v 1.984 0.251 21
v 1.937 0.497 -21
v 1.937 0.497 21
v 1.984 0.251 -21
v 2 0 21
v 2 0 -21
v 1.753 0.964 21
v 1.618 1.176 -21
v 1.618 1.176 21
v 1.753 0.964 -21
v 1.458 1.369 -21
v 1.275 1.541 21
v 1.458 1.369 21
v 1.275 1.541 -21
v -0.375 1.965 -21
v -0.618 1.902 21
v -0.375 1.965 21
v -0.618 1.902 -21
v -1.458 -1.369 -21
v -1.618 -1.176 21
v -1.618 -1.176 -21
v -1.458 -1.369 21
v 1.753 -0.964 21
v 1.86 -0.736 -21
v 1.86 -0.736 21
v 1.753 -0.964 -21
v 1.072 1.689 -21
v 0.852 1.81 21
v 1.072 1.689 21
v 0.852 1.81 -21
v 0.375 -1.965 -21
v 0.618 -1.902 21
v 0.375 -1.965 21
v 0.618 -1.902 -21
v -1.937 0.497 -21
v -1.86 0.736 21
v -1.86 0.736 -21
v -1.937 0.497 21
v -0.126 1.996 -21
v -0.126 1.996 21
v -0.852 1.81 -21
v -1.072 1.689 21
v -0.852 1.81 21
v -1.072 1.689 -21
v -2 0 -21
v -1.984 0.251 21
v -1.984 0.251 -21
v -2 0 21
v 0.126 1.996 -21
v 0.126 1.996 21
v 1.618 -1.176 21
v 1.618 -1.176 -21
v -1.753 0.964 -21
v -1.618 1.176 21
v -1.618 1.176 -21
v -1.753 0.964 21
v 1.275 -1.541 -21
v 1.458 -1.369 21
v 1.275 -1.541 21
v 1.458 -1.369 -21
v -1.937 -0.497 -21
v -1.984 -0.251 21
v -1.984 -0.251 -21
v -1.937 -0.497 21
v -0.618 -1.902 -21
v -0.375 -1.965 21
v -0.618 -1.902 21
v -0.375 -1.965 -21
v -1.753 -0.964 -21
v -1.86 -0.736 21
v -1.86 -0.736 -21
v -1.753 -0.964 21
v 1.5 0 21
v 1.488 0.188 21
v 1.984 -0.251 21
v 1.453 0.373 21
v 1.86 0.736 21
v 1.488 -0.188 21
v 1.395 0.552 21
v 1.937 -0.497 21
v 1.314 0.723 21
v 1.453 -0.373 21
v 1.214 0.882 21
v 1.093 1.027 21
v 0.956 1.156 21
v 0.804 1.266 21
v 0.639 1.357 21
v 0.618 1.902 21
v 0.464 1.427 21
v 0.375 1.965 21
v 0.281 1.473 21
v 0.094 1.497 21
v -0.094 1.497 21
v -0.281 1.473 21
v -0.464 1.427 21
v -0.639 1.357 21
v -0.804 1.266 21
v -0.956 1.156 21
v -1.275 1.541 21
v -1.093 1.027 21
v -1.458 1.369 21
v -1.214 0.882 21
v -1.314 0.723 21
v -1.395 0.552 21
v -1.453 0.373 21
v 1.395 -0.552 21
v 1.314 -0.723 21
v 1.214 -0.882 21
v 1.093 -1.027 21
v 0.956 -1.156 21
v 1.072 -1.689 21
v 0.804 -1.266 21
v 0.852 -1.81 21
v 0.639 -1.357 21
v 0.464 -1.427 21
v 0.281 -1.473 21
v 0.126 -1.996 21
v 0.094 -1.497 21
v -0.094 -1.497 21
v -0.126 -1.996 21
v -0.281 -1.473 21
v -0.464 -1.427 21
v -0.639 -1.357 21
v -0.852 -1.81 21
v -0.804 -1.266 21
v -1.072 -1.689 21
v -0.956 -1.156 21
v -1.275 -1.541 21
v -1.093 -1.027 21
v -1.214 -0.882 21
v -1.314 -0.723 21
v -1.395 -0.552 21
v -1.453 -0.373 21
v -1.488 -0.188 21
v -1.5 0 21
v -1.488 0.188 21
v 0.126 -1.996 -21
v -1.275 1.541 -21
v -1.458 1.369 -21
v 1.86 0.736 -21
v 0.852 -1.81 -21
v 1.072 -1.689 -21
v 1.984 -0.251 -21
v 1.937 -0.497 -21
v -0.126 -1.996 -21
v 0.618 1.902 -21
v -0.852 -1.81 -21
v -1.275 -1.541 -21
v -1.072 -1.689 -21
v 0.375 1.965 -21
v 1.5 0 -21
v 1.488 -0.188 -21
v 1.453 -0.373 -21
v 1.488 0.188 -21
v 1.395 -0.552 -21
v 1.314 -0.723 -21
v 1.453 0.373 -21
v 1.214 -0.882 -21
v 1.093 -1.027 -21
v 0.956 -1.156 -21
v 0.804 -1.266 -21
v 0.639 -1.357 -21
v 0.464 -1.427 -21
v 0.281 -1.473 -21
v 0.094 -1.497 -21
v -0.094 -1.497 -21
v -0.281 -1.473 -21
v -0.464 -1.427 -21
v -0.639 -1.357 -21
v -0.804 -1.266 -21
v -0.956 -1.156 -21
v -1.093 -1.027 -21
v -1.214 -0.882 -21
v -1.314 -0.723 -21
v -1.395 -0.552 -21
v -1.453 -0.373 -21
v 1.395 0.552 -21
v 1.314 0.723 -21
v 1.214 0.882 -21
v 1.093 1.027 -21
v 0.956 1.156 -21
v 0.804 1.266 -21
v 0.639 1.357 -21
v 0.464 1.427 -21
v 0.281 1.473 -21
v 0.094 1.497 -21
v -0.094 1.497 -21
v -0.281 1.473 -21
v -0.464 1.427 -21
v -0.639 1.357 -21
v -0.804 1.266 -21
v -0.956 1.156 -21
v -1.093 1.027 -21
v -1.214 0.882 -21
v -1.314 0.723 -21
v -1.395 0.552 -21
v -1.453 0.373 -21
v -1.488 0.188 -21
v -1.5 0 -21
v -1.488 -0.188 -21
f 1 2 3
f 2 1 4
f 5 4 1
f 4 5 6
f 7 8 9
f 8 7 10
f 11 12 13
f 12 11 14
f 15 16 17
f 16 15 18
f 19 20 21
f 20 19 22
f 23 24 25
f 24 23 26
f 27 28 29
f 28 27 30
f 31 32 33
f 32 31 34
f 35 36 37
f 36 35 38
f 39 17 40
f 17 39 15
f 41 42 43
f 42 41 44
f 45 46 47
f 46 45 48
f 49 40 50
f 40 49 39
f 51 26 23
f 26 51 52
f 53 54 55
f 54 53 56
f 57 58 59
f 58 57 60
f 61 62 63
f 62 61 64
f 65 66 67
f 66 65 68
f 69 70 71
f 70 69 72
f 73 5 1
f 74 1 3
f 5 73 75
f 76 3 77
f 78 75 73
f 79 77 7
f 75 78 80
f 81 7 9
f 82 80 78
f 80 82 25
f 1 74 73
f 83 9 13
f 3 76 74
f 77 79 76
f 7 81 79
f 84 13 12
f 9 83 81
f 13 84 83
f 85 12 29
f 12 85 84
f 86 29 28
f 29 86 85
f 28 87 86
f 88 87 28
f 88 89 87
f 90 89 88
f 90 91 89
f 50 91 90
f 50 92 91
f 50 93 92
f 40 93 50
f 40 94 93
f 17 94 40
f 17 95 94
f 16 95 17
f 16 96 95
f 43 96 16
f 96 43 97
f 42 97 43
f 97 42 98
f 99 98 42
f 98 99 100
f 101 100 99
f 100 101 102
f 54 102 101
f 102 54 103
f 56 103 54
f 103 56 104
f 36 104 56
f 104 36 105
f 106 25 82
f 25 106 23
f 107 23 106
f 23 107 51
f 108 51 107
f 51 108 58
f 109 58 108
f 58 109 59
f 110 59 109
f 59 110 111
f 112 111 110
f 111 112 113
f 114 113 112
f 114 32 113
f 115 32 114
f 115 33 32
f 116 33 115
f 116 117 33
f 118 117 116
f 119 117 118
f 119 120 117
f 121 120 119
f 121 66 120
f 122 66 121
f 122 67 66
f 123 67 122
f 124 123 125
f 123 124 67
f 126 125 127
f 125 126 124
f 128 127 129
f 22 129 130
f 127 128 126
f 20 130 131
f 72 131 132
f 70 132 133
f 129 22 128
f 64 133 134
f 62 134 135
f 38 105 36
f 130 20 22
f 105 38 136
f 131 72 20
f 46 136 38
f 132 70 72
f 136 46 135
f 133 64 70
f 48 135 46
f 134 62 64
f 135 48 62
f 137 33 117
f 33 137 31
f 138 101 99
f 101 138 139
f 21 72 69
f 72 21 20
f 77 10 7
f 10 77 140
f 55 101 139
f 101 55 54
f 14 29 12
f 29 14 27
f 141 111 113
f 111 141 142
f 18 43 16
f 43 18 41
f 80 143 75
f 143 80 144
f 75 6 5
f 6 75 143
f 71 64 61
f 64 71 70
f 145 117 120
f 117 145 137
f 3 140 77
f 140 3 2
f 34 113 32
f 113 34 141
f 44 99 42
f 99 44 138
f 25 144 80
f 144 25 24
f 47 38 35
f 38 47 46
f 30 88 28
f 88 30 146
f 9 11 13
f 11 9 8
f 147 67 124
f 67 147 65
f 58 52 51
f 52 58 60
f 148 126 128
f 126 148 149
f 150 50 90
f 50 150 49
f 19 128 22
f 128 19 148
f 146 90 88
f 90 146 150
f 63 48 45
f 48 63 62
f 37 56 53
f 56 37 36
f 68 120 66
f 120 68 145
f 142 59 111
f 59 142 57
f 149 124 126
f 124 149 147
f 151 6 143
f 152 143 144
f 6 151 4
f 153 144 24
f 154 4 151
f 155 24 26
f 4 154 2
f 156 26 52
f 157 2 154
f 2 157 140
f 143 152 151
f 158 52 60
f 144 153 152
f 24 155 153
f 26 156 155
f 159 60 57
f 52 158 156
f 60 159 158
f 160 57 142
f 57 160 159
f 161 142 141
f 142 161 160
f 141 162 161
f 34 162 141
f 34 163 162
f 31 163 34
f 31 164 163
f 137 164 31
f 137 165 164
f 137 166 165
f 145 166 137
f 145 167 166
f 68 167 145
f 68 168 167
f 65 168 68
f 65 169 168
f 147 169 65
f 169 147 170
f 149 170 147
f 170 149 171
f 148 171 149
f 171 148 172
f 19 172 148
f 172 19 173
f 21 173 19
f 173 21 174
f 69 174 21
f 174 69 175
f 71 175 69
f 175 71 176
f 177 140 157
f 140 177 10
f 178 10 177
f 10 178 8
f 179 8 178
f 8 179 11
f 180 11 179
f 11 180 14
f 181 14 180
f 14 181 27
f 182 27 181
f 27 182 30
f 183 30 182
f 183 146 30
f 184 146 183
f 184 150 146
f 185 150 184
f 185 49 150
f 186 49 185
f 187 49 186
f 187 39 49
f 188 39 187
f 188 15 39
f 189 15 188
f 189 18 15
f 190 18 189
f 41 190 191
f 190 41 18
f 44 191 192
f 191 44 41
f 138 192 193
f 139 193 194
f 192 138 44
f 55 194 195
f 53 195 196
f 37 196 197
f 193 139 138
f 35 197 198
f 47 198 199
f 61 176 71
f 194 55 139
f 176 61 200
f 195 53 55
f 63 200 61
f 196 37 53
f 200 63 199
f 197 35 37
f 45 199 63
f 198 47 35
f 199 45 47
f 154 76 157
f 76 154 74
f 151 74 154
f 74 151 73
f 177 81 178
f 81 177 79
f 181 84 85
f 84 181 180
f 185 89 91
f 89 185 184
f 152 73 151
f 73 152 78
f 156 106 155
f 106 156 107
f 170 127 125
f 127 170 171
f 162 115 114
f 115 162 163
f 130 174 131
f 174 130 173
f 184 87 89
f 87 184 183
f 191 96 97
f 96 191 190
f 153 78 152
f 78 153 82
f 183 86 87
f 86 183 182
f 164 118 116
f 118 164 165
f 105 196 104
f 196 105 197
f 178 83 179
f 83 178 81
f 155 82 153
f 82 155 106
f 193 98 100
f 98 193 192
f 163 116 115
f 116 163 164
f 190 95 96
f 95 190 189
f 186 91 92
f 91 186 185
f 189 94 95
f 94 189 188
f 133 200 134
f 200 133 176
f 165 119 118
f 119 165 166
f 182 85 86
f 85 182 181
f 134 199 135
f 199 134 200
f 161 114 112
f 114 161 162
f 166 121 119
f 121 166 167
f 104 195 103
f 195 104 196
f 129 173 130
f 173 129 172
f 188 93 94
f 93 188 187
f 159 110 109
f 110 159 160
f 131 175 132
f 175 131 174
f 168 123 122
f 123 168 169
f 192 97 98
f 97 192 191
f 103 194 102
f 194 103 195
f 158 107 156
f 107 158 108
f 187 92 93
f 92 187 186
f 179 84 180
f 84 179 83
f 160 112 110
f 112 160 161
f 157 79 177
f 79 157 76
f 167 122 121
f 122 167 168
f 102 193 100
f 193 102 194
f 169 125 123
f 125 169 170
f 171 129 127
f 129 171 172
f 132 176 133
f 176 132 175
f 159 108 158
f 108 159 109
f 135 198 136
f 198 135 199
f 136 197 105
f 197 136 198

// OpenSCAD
$fn = 50;


difference() {
	union() {
		translate(v = [0, 0, -21.0000000000]) {
			cylinder(h = 42, r = 2.0000000000);
		}
	}
	union() {
		translate(v = [0, 0, -100.0000000000]) {
			cylinder(h = 200, r = 1.5000000000);
		}
	}
}
